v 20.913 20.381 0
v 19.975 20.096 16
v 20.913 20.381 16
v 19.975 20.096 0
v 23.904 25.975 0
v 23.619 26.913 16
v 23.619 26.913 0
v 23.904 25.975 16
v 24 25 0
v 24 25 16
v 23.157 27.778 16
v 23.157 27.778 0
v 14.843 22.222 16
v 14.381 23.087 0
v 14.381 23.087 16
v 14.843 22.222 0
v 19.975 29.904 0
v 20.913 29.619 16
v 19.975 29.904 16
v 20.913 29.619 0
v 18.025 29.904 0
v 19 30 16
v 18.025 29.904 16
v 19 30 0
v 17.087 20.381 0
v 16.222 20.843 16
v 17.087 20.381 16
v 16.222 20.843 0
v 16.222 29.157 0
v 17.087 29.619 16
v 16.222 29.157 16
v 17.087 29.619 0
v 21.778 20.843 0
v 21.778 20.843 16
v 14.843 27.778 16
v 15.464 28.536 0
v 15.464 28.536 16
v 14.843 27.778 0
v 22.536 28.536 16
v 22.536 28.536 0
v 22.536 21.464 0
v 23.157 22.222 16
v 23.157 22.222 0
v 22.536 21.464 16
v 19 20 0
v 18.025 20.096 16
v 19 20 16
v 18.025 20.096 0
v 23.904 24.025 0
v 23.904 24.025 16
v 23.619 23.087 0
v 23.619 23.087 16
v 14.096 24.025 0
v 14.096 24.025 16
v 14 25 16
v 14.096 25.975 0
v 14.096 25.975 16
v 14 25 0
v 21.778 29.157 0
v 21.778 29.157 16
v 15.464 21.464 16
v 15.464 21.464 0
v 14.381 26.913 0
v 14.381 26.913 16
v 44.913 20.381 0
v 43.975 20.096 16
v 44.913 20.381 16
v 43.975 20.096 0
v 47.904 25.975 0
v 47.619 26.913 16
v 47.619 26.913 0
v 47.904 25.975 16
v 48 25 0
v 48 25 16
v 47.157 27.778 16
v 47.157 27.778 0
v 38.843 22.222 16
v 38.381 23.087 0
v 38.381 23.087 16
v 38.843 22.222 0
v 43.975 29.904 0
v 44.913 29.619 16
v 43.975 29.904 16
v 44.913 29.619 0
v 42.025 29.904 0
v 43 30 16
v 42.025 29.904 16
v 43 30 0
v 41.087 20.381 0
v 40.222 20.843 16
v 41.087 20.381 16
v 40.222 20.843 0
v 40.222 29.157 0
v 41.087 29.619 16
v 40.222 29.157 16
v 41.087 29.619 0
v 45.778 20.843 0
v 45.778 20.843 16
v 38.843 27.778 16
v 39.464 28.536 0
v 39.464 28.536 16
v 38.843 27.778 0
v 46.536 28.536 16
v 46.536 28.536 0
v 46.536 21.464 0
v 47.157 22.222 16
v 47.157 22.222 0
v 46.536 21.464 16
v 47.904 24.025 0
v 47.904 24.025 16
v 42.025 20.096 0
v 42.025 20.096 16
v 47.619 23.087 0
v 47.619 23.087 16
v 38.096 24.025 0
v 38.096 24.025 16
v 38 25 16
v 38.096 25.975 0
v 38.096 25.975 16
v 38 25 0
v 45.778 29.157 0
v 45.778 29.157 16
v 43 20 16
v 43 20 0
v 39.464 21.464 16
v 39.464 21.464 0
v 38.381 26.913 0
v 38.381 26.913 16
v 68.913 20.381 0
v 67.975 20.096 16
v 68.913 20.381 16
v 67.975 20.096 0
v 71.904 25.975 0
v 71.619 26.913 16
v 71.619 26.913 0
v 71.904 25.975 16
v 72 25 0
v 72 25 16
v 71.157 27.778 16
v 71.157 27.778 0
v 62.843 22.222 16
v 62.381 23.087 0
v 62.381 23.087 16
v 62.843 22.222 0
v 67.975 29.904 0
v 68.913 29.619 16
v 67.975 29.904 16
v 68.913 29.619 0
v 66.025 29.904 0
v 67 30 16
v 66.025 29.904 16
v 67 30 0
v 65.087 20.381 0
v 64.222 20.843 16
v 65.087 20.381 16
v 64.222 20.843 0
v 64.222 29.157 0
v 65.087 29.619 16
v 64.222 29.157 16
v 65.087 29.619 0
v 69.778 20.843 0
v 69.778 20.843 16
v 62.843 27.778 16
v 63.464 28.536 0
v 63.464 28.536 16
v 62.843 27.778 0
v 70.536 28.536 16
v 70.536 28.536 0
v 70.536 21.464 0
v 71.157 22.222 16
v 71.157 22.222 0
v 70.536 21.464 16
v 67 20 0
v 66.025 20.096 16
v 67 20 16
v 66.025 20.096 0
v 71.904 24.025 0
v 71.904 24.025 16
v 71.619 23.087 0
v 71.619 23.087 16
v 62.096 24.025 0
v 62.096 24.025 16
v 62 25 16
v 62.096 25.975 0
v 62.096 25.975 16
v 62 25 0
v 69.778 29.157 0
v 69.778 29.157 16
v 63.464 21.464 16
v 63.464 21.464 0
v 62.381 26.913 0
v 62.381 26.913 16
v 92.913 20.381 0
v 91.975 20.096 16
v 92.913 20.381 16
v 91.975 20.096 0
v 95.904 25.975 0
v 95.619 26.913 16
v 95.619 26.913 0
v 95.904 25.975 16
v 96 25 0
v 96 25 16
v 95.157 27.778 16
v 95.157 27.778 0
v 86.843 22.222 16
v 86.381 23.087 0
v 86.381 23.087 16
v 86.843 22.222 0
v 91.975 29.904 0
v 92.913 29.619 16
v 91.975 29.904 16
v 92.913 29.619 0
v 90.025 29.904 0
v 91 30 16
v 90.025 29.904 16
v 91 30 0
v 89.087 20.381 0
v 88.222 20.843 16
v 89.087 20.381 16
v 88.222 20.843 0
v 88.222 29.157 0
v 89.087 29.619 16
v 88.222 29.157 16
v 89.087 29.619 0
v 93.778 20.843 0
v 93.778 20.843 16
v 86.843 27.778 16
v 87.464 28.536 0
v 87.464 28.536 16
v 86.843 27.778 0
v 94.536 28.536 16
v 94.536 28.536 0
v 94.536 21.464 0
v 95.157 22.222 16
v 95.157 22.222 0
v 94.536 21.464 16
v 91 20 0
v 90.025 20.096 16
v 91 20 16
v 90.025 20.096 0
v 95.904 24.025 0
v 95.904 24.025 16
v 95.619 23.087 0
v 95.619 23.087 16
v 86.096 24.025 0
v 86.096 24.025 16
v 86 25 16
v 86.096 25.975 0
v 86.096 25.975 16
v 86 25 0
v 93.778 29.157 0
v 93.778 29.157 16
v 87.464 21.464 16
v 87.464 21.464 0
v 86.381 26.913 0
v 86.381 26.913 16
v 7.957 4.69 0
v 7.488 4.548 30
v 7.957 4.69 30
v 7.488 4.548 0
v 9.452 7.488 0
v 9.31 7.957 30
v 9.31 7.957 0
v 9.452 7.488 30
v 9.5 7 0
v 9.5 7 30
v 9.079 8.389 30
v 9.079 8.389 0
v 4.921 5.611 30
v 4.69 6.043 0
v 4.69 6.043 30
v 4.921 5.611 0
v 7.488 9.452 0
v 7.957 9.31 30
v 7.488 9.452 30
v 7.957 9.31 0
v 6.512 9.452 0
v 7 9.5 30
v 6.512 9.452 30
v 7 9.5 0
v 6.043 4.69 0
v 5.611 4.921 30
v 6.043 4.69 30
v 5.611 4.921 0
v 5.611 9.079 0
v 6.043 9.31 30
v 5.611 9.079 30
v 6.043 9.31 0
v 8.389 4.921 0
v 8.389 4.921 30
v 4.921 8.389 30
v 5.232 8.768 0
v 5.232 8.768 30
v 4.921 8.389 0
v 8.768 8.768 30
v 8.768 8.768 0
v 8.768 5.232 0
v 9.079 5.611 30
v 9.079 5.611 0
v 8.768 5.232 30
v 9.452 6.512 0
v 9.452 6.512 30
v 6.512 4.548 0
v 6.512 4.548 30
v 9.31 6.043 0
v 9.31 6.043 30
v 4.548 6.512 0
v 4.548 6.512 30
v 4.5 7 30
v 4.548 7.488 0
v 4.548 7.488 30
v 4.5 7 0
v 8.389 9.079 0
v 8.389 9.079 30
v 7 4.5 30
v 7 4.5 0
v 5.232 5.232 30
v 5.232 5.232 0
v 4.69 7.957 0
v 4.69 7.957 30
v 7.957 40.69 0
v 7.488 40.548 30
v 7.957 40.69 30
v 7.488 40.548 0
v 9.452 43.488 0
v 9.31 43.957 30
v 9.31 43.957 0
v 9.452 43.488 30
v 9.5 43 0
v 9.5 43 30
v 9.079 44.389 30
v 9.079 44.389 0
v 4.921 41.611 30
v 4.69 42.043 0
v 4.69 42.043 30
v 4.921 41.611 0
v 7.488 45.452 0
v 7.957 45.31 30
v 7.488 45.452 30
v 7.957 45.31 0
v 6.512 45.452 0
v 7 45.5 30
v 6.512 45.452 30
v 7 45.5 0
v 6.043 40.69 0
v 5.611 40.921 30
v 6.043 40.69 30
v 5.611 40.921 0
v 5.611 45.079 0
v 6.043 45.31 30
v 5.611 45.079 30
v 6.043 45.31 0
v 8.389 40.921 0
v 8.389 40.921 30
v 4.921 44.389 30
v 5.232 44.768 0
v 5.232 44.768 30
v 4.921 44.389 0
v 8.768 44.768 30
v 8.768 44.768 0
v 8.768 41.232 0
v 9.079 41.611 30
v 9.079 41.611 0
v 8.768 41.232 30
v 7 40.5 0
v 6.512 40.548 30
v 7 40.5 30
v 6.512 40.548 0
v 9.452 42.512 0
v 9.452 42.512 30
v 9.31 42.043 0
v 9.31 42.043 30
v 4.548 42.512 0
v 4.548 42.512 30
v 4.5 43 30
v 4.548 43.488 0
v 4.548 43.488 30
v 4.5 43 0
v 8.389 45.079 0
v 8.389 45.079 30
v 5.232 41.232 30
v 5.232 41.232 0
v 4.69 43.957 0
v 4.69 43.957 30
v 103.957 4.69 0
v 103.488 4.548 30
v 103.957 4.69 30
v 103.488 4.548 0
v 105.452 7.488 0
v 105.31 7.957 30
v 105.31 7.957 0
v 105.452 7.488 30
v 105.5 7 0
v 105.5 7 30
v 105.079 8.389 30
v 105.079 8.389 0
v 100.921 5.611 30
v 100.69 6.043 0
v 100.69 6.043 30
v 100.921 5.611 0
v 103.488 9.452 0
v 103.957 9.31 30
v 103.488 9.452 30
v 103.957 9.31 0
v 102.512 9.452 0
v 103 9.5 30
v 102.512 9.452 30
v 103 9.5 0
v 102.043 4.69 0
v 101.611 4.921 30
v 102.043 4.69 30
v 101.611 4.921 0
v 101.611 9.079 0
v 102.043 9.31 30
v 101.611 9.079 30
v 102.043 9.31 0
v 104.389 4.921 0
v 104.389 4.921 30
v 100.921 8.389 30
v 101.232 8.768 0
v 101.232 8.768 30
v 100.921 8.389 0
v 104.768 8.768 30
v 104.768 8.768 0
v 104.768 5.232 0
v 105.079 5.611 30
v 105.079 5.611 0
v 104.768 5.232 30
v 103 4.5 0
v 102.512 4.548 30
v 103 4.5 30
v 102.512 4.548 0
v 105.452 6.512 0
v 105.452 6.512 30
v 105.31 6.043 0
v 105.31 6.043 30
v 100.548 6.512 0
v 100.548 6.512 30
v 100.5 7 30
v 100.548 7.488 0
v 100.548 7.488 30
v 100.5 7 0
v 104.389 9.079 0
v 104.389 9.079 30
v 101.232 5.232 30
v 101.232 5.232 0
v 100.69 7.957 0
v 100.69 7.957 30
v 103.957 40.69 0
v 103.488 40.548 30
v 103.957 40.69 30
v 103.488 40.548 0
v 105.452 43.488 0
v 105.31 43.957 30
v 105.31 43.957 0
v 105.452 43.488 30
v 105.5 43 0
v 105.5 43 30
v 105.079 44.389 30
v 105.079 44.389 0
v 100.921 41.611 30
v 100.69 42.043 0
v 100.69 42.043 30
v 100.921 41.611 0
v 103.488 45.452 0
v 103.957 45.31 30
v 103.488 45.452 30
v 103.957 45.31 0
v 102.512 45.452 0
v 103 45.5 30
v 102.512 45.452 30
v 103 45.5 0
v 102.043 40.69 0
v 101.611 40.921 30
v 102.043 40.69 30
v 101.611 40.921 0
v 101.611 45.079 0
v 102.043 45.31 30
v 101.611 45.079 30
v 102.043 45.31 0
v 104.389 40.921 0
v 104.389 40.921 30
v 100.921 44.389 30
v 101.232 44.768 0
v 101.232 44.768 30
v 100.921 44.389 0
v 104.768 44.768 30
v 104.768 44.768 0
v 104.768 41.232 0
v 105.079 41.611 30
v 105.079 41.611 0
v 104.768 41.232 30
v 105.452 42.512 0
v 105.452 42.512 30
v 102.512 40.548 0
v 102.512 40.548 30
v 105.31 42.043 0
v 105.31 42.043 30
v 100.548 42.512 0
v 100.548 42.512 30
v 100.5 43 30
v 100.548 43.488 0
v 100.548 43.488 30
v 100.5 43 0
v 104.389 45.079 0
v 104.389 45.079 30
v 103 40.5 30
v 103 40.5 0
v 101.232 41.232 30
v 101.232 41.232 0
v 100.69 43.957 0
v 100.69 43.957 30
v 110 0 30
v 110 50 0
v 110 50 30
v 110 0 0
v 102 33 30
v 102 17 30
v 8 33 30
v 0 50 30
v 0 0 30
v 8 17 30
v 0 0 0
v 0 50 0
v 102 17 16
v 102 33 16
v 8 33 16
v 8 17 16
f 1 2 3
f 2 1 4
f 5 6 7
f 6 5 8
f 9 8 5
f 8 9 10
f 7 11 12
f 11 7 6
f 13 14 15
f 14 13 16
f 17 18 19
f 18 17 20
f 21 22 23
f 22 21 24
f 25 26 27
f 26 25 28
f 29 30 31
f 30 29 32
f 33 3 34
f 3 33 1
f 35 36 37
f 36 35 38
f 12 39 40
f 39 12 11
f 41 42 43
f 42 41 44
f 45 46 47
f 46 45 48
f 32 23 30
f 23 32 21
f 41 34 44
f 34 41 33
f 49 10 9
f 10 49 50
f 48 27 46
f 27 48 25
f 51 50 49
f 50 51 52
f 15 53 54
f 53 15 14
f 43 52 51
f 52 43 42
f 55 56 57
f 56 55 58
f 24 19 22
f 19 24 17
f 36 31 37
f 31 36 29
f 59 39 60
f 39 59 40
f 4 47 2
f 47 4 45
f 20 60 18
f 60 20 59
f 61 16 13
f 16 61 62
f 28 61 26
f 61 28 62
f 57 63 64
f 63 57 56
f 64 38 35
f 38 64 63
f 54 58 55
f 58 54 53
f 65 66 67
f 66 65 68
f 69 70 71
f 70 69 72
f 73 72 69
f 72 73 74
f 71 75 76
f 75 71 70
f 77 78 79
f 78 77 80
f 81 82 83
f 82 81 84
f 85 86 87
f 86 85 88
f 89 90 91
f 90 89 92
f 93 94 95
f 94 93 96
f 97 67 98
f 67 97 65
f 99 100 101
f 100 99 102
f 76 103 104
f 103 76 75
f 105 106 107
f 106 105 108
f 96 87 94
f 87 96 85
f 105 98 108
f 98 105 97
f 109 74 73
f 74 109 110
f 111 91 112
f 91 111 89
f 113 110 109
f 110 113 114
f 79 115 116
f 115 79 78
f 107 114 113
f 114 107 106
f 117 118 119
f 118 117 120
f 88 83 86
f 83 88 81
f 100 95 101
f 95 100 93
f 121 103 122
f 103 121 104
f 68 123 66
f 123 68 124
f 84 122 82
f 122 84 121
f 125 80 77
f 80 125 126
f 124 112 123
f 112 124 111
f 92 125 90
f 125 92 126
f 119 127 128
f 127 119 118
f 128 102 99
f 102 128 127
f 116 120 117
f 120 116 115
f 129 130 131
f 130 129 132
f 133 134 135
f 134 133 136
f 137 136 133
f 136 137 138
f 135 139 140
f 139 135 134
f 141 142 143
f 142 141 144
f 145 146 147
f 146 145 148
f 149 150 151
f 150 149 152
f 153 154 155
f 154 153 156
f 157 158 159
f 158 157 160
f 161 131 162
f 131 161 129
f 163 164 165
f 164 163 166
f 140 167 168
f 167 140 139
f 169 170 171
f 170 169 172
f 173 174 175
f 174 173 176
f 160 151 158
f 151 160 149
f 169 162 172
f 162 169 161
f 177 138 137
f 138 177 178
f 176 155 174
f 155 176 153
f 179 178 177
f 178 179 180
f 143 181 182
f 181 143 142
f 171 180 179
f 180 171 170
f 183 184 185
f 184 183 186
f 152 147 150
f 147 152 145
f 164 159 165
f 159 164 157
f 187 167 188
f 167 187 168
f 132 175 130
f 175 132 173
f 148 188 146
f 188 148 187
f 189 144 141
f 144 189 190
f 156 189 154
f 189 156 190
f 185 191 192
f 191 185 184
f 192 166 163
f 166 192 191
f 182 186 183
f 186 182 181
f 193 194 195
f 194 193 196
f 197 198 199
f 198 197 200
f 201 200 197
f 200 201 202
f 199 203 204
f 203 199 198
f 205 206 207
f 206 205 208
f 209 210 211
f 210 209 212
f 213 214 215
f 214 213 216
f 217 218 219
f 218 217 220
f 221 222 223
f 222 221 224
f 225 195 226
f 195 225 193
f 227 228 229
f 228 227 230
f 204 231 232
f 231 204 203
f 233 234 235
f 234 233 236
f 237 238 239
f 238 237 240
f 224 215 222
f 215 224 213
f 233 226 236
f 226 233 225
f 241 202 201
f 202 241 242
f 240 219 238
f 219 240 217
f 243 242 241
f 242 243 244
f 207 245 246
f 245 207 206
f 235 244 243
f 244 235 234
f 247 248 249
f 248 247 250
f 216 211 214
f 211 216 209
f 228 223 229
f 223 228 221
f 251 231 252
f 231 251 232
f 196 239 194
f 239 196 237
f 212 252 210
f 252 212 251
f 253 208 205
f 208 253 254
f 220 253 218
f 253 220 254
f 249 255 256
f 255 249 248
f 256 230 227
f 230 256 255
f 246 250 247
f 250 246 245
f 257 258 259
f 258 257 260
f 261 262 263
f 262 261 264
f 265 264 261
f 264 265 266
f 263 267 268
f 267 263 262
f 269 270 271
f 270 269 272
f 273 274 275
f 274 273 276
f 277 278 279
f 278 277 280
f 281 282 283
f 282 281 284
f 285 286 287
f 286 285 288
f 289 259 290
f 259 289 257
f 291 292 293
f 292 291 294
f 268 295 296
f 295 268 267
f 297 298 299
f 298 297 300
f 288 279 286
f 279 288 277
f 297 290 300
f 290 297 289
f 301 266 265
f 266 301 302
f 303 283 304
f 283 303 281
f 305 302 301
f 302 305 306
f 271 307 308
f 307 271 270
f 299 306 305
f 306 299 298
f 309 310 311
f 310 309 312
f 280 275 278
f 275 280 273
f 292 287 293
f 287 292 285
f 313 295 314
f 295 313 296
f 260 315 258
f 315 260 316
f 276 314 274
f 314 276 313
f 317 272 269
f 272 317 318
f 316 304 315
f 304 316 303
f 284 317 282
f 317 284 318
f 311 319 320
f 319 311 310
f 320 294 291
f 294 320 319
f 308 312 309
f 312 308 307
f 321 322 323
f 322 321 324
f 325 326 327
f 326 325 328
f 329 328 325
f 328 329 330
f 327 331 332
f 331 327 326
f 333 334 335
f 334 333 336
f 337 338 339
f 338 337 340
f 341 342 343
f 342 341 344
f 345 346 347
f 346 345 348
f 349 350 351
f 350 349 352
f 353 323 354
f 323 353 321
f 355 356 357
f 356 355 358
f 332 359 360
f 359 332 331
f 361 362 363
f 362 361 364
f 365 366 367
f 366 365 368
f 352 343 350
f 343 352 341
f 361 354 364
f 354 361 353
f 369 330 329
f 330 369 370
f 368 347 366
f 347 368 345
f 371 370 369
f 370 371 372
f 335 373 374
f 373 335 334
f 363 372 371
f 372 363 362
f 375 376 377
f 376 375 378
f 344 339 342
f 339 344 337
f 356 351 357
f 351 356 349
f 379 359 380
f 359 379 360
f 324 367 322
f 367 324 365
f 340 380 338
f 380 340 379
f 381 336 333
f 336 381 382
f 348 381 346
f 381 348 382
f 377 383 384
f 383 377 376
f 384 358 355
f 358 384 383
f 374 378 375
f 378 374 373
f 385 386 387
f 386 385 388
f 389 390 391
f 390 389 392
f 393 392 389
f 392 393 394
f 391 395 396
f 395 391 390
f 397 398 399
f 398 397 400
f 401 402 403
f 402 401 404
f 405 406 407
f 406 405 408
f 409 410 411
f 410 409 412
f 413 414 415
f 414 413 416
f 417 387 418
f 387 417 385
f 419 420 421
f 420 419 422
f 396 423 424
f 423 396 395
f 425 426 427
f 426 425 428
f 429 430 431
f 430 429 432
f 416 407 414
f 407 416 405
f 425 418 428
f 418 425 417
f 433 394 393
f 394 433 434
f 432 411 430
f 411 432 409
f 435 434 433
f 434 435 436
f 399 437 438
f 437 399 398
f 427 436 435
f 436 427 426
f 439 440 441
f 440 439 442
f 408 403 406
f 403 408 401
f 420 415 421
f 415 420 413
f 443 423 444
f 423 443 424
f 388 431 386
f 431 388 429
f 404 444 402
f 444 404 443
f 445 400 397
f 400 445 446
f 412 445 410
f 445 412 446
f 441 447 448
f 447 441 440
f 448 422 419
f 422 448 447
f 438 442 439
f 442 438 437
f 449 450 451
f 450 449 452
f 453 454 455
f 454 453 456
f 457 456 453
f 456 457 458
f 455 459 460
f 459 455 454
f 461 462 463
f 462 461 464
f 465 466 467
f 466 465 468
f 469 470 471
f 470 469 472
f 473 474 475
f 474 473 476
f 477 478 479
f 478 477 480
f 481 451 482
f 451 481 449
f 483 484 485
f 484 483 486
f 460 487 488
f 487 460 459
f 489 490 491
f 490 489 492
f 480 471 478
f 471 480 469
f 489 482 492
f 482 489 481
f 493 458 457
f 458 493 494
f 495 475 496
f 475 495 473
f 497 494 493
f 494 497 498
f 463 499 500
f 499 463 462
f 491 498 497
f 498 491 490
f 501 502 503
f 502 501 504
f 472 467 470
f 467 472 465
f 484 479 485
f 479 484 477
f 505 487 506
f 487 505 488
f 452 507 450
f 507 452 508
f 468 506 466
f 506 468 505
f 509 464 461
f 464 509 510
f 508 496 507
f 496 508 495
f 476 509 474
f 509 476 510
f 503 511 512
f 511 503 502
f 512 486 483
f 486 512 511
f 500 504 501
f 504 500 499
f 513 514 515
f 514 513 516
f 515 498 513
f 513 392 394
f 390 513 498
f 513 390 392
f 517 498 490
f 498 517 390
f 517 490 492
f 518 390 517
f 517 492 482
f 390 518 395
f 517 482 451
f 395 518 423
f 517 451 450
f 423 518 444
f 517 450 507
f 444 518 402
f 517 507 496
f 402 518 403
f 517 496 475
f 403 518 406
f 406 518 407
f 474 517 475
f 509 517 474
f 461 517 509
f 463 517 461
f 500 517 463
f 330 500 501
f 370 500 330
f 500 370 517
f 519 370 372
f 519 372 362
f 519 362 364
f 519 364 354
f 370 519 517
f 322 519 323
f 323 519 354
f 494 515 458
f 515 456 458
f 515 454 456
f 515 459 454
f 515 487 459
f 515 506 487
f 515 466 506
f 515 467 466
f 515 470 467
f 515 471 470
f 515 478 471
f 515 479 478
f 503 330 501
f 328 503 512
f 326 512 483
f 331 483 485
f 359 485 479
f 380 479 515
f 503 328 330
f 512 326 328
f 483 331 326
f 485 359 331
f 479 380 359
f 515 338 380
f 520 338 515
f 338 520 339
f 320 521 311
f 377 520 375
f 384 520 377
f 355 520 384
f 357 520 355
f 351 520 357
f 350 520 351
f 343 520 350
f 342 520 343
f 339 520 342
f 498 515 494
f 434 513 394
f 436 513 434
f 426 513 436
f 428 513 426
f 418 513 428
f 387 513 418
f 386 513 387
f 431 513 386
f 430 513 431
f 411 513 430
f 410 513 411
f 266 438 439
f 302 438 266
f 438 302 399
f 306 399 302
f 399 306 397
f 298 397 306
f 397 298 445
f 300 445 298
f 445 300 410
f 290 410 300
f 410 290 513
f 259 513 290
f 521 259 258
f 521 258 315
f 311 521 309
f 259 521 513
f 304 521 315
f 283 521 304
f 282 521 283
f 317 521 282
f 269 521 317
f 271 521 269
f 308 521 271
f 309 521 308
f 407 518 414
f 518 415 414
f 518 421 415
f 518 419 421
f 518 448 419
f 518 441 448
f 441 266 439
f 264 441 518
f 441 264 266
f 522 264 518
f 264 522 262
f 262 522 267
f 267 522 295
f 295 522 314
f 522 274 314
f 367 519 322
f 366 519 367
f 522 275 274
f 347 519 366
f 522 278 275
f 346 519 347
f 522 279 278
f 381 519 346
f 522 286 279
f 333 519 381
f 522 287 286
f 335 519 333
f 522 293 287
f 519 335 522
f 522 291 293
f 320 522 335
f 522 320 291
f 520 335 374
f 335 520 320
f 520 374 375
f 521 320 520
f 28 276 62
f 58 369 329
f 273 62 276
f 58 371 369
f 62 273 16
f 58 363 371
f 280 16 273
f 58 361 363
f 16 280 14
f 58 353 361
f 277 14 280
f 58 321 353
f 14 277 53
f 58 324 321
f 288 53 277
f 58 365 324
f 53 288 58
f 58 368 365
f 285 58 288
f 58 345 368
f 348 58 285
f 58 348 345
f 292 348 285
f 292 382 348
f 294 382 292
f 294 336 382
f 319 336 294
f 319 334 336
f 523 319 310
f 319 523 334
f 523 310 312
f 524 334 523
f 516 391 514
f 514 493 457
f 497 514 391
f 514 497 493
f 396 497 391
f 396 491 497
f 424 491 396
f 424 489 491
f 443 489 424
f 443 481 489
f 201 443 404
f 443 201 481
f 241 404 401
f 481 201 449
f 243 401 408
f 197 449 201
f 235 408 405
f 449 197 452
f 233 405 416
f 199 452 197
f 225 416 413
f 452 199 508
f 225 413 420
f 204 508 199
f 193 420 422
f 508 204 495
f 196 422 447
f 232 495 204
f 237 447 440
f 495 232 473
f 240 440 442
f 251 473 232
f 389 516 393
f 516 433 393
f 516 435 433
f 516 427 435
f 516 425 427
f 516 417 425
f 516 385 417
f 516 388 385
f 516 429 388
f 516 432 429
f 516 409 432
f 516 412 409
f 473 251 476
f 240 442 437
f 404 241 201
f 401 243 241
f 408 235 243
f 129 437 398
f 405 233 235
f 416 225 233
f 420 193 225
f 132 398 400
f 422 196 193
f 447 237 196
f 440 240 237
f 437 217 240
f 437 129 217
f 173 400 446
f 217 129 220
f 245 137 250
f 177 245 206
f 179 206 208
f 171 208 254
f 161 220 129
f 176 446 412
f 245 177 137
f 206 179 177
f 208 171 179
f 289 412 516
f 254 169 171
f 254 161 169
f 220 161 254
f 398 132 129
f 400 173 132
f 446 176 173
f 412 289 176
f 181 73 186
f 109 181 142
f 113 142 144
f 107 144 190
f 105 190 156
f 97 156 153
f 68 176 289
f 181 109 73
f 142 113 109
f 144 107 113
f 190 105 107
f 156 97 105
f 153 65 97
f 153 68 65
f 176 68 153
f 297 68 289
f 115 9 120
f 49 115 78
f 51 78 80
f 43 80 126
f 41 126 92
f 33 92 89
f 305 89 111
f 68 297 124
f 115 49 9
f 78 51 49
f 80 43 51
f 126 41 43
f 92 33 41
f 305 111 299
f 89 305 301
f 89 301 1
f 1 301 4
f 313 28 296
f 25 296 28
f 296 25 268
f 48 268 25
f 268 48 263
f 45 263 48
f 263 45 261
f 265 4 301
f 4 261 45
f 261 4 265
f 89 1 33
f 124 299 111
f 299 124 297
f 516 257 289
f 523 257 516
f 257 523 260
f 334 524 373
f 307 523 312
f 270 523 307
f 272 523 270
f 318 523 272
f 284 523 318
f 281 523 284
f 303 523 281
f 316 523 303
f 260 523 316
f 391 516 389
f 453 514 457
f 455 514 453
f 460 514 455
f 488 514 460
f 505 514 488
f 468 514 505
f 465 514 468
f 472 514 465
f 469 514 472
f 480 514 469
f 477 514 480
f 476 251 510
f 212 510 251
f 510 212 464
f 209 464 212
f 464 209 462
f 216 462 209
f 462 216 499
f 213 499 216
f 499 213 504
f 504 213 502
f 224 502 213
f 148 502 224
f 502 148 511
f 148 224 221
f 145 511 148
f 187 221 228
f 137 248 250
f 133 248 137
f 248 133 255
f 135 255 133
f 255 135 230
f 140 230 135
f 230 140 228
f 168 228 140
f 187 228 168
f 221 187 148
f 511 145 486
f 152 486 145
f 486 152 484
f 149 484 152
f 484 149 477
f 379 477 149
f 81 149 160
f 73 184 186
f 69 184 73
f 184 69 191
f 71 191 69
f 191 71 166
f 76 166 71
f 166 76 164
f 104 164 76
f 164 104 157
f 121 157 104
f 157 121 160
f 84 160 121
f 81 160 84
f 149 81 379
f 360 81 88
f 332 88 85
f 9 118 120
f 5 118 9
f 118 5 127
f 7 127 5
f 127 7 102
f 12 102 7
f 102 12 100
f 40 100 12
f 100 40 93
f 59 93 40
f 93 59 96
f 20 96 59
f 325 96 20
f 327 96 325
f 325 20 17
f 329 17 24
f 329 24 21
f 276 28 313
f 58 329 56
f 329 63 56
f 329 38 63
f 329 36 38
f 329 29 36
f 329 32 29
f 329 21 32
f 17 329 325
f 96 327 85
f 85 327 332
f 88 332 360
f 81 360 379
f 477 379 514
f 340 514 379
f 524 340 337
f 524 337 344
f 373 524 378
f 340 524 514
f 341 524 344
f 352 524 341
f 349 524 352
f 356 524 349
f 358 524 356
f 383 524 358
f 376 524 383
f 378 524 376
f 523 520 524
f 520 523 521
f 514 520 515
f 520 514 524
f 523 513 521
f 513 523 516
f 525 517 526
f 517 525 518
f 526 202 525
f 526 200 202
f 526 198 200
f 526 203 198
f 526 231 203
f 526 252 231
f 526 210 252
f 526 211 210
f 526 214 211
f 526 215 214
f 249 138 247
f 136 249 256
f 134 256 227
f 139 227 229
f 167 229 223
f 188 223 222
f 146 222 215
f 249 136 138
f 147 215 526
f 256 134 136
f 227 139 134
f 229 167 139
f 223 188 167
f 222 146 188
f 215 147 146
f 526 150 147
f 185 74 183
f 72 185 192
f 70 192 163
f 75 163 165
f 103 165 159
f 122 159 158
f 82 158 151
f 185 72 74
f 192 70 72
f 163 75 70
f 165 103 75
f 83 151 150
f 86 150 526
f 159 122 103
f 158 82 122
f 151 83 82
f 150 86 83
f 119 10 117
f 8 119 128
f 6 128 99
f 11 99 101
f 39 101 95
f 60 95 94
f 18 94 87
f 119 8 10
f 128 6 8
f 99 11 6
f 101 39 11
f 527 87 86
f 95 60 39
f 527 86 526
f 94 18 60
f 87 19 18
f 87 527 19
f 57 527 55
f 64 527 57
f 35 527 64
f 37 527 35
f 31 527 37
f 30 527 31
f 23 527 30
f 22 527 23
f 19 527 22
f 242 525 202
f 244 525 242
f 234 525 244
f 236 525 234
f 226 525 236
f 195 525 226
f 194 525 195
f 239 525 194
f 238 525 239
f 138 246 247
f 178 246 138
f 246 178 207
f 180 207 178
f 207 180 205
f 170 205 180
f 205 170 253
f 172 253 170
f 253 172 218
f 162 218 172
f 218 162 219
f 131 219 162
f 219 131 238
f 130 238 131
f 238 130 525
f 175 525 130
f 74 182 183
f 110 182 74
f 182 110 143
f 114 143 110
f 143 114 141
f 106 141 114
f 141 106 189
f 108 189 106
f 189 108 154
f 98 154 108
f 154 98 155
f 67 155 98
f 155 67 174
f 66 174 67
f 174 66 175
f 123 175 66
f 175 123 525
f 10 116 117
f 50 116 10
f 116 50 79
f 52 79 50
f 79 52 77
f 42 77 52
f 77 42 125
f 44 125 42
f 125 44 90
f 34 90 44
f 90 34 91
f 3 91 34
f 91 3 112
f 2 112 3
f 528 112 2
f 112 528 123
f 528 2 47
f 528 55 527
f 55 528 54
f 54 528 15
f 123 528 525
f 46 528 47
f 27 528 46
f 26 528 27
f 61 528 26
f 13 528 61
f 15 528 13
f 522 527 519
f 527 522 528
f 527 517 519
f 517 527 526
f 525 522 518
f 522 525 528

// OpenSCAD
$fn = 32;

// ----------------------------------------------------------------------
// Manifold block: gallery_top manifold
// ----------------------------------------------------------------------

// --- parameters (mm) ---
block_l = 110;            // block length, X
block_w = 50;             // block width, Y
block_h = 30;             // block height, Z
port_d = 10;              // port bore diameter
port_pitch = 24;          // port pitch along X
gallery_d = 16;           // top gallery width, Y
gallery_depth = 14;       // gallery pocket depth
wall_p = 8;               // gallery end wall thickness, X
mnt_d = 5;                // mounting hole diameter
mnt_in = 7;               // mounting hole inset from the edges

n_ports = 4;  // ports in the row
port_x0 = (block_l - (n_ports - 1) * port_pitch) / 2;  // first port X

difference() {
  cube([block_l, block_w, block_h]);
  for (i = [0 : n_ports - 1])
    translate([port_x0 + i * port_pitch, block_w / 2, -1])
      cylinder(h = block_h + 2, d = port_d);
  translate([wall_p, block_w / 2 - gallery_d / 2, block_h - gallery_depth])
    cube([block_l - 2 * wall_p, gallery_d, gallery_depth + 1]);
  for (cx = [mnt_in, block_l - mnt_in])
    for (cy = [mnt_in, block_w - mnt_in])
      translate([cx, cy, -1]) cylinder(h = block_h + 2, d = mnt_d);
}
